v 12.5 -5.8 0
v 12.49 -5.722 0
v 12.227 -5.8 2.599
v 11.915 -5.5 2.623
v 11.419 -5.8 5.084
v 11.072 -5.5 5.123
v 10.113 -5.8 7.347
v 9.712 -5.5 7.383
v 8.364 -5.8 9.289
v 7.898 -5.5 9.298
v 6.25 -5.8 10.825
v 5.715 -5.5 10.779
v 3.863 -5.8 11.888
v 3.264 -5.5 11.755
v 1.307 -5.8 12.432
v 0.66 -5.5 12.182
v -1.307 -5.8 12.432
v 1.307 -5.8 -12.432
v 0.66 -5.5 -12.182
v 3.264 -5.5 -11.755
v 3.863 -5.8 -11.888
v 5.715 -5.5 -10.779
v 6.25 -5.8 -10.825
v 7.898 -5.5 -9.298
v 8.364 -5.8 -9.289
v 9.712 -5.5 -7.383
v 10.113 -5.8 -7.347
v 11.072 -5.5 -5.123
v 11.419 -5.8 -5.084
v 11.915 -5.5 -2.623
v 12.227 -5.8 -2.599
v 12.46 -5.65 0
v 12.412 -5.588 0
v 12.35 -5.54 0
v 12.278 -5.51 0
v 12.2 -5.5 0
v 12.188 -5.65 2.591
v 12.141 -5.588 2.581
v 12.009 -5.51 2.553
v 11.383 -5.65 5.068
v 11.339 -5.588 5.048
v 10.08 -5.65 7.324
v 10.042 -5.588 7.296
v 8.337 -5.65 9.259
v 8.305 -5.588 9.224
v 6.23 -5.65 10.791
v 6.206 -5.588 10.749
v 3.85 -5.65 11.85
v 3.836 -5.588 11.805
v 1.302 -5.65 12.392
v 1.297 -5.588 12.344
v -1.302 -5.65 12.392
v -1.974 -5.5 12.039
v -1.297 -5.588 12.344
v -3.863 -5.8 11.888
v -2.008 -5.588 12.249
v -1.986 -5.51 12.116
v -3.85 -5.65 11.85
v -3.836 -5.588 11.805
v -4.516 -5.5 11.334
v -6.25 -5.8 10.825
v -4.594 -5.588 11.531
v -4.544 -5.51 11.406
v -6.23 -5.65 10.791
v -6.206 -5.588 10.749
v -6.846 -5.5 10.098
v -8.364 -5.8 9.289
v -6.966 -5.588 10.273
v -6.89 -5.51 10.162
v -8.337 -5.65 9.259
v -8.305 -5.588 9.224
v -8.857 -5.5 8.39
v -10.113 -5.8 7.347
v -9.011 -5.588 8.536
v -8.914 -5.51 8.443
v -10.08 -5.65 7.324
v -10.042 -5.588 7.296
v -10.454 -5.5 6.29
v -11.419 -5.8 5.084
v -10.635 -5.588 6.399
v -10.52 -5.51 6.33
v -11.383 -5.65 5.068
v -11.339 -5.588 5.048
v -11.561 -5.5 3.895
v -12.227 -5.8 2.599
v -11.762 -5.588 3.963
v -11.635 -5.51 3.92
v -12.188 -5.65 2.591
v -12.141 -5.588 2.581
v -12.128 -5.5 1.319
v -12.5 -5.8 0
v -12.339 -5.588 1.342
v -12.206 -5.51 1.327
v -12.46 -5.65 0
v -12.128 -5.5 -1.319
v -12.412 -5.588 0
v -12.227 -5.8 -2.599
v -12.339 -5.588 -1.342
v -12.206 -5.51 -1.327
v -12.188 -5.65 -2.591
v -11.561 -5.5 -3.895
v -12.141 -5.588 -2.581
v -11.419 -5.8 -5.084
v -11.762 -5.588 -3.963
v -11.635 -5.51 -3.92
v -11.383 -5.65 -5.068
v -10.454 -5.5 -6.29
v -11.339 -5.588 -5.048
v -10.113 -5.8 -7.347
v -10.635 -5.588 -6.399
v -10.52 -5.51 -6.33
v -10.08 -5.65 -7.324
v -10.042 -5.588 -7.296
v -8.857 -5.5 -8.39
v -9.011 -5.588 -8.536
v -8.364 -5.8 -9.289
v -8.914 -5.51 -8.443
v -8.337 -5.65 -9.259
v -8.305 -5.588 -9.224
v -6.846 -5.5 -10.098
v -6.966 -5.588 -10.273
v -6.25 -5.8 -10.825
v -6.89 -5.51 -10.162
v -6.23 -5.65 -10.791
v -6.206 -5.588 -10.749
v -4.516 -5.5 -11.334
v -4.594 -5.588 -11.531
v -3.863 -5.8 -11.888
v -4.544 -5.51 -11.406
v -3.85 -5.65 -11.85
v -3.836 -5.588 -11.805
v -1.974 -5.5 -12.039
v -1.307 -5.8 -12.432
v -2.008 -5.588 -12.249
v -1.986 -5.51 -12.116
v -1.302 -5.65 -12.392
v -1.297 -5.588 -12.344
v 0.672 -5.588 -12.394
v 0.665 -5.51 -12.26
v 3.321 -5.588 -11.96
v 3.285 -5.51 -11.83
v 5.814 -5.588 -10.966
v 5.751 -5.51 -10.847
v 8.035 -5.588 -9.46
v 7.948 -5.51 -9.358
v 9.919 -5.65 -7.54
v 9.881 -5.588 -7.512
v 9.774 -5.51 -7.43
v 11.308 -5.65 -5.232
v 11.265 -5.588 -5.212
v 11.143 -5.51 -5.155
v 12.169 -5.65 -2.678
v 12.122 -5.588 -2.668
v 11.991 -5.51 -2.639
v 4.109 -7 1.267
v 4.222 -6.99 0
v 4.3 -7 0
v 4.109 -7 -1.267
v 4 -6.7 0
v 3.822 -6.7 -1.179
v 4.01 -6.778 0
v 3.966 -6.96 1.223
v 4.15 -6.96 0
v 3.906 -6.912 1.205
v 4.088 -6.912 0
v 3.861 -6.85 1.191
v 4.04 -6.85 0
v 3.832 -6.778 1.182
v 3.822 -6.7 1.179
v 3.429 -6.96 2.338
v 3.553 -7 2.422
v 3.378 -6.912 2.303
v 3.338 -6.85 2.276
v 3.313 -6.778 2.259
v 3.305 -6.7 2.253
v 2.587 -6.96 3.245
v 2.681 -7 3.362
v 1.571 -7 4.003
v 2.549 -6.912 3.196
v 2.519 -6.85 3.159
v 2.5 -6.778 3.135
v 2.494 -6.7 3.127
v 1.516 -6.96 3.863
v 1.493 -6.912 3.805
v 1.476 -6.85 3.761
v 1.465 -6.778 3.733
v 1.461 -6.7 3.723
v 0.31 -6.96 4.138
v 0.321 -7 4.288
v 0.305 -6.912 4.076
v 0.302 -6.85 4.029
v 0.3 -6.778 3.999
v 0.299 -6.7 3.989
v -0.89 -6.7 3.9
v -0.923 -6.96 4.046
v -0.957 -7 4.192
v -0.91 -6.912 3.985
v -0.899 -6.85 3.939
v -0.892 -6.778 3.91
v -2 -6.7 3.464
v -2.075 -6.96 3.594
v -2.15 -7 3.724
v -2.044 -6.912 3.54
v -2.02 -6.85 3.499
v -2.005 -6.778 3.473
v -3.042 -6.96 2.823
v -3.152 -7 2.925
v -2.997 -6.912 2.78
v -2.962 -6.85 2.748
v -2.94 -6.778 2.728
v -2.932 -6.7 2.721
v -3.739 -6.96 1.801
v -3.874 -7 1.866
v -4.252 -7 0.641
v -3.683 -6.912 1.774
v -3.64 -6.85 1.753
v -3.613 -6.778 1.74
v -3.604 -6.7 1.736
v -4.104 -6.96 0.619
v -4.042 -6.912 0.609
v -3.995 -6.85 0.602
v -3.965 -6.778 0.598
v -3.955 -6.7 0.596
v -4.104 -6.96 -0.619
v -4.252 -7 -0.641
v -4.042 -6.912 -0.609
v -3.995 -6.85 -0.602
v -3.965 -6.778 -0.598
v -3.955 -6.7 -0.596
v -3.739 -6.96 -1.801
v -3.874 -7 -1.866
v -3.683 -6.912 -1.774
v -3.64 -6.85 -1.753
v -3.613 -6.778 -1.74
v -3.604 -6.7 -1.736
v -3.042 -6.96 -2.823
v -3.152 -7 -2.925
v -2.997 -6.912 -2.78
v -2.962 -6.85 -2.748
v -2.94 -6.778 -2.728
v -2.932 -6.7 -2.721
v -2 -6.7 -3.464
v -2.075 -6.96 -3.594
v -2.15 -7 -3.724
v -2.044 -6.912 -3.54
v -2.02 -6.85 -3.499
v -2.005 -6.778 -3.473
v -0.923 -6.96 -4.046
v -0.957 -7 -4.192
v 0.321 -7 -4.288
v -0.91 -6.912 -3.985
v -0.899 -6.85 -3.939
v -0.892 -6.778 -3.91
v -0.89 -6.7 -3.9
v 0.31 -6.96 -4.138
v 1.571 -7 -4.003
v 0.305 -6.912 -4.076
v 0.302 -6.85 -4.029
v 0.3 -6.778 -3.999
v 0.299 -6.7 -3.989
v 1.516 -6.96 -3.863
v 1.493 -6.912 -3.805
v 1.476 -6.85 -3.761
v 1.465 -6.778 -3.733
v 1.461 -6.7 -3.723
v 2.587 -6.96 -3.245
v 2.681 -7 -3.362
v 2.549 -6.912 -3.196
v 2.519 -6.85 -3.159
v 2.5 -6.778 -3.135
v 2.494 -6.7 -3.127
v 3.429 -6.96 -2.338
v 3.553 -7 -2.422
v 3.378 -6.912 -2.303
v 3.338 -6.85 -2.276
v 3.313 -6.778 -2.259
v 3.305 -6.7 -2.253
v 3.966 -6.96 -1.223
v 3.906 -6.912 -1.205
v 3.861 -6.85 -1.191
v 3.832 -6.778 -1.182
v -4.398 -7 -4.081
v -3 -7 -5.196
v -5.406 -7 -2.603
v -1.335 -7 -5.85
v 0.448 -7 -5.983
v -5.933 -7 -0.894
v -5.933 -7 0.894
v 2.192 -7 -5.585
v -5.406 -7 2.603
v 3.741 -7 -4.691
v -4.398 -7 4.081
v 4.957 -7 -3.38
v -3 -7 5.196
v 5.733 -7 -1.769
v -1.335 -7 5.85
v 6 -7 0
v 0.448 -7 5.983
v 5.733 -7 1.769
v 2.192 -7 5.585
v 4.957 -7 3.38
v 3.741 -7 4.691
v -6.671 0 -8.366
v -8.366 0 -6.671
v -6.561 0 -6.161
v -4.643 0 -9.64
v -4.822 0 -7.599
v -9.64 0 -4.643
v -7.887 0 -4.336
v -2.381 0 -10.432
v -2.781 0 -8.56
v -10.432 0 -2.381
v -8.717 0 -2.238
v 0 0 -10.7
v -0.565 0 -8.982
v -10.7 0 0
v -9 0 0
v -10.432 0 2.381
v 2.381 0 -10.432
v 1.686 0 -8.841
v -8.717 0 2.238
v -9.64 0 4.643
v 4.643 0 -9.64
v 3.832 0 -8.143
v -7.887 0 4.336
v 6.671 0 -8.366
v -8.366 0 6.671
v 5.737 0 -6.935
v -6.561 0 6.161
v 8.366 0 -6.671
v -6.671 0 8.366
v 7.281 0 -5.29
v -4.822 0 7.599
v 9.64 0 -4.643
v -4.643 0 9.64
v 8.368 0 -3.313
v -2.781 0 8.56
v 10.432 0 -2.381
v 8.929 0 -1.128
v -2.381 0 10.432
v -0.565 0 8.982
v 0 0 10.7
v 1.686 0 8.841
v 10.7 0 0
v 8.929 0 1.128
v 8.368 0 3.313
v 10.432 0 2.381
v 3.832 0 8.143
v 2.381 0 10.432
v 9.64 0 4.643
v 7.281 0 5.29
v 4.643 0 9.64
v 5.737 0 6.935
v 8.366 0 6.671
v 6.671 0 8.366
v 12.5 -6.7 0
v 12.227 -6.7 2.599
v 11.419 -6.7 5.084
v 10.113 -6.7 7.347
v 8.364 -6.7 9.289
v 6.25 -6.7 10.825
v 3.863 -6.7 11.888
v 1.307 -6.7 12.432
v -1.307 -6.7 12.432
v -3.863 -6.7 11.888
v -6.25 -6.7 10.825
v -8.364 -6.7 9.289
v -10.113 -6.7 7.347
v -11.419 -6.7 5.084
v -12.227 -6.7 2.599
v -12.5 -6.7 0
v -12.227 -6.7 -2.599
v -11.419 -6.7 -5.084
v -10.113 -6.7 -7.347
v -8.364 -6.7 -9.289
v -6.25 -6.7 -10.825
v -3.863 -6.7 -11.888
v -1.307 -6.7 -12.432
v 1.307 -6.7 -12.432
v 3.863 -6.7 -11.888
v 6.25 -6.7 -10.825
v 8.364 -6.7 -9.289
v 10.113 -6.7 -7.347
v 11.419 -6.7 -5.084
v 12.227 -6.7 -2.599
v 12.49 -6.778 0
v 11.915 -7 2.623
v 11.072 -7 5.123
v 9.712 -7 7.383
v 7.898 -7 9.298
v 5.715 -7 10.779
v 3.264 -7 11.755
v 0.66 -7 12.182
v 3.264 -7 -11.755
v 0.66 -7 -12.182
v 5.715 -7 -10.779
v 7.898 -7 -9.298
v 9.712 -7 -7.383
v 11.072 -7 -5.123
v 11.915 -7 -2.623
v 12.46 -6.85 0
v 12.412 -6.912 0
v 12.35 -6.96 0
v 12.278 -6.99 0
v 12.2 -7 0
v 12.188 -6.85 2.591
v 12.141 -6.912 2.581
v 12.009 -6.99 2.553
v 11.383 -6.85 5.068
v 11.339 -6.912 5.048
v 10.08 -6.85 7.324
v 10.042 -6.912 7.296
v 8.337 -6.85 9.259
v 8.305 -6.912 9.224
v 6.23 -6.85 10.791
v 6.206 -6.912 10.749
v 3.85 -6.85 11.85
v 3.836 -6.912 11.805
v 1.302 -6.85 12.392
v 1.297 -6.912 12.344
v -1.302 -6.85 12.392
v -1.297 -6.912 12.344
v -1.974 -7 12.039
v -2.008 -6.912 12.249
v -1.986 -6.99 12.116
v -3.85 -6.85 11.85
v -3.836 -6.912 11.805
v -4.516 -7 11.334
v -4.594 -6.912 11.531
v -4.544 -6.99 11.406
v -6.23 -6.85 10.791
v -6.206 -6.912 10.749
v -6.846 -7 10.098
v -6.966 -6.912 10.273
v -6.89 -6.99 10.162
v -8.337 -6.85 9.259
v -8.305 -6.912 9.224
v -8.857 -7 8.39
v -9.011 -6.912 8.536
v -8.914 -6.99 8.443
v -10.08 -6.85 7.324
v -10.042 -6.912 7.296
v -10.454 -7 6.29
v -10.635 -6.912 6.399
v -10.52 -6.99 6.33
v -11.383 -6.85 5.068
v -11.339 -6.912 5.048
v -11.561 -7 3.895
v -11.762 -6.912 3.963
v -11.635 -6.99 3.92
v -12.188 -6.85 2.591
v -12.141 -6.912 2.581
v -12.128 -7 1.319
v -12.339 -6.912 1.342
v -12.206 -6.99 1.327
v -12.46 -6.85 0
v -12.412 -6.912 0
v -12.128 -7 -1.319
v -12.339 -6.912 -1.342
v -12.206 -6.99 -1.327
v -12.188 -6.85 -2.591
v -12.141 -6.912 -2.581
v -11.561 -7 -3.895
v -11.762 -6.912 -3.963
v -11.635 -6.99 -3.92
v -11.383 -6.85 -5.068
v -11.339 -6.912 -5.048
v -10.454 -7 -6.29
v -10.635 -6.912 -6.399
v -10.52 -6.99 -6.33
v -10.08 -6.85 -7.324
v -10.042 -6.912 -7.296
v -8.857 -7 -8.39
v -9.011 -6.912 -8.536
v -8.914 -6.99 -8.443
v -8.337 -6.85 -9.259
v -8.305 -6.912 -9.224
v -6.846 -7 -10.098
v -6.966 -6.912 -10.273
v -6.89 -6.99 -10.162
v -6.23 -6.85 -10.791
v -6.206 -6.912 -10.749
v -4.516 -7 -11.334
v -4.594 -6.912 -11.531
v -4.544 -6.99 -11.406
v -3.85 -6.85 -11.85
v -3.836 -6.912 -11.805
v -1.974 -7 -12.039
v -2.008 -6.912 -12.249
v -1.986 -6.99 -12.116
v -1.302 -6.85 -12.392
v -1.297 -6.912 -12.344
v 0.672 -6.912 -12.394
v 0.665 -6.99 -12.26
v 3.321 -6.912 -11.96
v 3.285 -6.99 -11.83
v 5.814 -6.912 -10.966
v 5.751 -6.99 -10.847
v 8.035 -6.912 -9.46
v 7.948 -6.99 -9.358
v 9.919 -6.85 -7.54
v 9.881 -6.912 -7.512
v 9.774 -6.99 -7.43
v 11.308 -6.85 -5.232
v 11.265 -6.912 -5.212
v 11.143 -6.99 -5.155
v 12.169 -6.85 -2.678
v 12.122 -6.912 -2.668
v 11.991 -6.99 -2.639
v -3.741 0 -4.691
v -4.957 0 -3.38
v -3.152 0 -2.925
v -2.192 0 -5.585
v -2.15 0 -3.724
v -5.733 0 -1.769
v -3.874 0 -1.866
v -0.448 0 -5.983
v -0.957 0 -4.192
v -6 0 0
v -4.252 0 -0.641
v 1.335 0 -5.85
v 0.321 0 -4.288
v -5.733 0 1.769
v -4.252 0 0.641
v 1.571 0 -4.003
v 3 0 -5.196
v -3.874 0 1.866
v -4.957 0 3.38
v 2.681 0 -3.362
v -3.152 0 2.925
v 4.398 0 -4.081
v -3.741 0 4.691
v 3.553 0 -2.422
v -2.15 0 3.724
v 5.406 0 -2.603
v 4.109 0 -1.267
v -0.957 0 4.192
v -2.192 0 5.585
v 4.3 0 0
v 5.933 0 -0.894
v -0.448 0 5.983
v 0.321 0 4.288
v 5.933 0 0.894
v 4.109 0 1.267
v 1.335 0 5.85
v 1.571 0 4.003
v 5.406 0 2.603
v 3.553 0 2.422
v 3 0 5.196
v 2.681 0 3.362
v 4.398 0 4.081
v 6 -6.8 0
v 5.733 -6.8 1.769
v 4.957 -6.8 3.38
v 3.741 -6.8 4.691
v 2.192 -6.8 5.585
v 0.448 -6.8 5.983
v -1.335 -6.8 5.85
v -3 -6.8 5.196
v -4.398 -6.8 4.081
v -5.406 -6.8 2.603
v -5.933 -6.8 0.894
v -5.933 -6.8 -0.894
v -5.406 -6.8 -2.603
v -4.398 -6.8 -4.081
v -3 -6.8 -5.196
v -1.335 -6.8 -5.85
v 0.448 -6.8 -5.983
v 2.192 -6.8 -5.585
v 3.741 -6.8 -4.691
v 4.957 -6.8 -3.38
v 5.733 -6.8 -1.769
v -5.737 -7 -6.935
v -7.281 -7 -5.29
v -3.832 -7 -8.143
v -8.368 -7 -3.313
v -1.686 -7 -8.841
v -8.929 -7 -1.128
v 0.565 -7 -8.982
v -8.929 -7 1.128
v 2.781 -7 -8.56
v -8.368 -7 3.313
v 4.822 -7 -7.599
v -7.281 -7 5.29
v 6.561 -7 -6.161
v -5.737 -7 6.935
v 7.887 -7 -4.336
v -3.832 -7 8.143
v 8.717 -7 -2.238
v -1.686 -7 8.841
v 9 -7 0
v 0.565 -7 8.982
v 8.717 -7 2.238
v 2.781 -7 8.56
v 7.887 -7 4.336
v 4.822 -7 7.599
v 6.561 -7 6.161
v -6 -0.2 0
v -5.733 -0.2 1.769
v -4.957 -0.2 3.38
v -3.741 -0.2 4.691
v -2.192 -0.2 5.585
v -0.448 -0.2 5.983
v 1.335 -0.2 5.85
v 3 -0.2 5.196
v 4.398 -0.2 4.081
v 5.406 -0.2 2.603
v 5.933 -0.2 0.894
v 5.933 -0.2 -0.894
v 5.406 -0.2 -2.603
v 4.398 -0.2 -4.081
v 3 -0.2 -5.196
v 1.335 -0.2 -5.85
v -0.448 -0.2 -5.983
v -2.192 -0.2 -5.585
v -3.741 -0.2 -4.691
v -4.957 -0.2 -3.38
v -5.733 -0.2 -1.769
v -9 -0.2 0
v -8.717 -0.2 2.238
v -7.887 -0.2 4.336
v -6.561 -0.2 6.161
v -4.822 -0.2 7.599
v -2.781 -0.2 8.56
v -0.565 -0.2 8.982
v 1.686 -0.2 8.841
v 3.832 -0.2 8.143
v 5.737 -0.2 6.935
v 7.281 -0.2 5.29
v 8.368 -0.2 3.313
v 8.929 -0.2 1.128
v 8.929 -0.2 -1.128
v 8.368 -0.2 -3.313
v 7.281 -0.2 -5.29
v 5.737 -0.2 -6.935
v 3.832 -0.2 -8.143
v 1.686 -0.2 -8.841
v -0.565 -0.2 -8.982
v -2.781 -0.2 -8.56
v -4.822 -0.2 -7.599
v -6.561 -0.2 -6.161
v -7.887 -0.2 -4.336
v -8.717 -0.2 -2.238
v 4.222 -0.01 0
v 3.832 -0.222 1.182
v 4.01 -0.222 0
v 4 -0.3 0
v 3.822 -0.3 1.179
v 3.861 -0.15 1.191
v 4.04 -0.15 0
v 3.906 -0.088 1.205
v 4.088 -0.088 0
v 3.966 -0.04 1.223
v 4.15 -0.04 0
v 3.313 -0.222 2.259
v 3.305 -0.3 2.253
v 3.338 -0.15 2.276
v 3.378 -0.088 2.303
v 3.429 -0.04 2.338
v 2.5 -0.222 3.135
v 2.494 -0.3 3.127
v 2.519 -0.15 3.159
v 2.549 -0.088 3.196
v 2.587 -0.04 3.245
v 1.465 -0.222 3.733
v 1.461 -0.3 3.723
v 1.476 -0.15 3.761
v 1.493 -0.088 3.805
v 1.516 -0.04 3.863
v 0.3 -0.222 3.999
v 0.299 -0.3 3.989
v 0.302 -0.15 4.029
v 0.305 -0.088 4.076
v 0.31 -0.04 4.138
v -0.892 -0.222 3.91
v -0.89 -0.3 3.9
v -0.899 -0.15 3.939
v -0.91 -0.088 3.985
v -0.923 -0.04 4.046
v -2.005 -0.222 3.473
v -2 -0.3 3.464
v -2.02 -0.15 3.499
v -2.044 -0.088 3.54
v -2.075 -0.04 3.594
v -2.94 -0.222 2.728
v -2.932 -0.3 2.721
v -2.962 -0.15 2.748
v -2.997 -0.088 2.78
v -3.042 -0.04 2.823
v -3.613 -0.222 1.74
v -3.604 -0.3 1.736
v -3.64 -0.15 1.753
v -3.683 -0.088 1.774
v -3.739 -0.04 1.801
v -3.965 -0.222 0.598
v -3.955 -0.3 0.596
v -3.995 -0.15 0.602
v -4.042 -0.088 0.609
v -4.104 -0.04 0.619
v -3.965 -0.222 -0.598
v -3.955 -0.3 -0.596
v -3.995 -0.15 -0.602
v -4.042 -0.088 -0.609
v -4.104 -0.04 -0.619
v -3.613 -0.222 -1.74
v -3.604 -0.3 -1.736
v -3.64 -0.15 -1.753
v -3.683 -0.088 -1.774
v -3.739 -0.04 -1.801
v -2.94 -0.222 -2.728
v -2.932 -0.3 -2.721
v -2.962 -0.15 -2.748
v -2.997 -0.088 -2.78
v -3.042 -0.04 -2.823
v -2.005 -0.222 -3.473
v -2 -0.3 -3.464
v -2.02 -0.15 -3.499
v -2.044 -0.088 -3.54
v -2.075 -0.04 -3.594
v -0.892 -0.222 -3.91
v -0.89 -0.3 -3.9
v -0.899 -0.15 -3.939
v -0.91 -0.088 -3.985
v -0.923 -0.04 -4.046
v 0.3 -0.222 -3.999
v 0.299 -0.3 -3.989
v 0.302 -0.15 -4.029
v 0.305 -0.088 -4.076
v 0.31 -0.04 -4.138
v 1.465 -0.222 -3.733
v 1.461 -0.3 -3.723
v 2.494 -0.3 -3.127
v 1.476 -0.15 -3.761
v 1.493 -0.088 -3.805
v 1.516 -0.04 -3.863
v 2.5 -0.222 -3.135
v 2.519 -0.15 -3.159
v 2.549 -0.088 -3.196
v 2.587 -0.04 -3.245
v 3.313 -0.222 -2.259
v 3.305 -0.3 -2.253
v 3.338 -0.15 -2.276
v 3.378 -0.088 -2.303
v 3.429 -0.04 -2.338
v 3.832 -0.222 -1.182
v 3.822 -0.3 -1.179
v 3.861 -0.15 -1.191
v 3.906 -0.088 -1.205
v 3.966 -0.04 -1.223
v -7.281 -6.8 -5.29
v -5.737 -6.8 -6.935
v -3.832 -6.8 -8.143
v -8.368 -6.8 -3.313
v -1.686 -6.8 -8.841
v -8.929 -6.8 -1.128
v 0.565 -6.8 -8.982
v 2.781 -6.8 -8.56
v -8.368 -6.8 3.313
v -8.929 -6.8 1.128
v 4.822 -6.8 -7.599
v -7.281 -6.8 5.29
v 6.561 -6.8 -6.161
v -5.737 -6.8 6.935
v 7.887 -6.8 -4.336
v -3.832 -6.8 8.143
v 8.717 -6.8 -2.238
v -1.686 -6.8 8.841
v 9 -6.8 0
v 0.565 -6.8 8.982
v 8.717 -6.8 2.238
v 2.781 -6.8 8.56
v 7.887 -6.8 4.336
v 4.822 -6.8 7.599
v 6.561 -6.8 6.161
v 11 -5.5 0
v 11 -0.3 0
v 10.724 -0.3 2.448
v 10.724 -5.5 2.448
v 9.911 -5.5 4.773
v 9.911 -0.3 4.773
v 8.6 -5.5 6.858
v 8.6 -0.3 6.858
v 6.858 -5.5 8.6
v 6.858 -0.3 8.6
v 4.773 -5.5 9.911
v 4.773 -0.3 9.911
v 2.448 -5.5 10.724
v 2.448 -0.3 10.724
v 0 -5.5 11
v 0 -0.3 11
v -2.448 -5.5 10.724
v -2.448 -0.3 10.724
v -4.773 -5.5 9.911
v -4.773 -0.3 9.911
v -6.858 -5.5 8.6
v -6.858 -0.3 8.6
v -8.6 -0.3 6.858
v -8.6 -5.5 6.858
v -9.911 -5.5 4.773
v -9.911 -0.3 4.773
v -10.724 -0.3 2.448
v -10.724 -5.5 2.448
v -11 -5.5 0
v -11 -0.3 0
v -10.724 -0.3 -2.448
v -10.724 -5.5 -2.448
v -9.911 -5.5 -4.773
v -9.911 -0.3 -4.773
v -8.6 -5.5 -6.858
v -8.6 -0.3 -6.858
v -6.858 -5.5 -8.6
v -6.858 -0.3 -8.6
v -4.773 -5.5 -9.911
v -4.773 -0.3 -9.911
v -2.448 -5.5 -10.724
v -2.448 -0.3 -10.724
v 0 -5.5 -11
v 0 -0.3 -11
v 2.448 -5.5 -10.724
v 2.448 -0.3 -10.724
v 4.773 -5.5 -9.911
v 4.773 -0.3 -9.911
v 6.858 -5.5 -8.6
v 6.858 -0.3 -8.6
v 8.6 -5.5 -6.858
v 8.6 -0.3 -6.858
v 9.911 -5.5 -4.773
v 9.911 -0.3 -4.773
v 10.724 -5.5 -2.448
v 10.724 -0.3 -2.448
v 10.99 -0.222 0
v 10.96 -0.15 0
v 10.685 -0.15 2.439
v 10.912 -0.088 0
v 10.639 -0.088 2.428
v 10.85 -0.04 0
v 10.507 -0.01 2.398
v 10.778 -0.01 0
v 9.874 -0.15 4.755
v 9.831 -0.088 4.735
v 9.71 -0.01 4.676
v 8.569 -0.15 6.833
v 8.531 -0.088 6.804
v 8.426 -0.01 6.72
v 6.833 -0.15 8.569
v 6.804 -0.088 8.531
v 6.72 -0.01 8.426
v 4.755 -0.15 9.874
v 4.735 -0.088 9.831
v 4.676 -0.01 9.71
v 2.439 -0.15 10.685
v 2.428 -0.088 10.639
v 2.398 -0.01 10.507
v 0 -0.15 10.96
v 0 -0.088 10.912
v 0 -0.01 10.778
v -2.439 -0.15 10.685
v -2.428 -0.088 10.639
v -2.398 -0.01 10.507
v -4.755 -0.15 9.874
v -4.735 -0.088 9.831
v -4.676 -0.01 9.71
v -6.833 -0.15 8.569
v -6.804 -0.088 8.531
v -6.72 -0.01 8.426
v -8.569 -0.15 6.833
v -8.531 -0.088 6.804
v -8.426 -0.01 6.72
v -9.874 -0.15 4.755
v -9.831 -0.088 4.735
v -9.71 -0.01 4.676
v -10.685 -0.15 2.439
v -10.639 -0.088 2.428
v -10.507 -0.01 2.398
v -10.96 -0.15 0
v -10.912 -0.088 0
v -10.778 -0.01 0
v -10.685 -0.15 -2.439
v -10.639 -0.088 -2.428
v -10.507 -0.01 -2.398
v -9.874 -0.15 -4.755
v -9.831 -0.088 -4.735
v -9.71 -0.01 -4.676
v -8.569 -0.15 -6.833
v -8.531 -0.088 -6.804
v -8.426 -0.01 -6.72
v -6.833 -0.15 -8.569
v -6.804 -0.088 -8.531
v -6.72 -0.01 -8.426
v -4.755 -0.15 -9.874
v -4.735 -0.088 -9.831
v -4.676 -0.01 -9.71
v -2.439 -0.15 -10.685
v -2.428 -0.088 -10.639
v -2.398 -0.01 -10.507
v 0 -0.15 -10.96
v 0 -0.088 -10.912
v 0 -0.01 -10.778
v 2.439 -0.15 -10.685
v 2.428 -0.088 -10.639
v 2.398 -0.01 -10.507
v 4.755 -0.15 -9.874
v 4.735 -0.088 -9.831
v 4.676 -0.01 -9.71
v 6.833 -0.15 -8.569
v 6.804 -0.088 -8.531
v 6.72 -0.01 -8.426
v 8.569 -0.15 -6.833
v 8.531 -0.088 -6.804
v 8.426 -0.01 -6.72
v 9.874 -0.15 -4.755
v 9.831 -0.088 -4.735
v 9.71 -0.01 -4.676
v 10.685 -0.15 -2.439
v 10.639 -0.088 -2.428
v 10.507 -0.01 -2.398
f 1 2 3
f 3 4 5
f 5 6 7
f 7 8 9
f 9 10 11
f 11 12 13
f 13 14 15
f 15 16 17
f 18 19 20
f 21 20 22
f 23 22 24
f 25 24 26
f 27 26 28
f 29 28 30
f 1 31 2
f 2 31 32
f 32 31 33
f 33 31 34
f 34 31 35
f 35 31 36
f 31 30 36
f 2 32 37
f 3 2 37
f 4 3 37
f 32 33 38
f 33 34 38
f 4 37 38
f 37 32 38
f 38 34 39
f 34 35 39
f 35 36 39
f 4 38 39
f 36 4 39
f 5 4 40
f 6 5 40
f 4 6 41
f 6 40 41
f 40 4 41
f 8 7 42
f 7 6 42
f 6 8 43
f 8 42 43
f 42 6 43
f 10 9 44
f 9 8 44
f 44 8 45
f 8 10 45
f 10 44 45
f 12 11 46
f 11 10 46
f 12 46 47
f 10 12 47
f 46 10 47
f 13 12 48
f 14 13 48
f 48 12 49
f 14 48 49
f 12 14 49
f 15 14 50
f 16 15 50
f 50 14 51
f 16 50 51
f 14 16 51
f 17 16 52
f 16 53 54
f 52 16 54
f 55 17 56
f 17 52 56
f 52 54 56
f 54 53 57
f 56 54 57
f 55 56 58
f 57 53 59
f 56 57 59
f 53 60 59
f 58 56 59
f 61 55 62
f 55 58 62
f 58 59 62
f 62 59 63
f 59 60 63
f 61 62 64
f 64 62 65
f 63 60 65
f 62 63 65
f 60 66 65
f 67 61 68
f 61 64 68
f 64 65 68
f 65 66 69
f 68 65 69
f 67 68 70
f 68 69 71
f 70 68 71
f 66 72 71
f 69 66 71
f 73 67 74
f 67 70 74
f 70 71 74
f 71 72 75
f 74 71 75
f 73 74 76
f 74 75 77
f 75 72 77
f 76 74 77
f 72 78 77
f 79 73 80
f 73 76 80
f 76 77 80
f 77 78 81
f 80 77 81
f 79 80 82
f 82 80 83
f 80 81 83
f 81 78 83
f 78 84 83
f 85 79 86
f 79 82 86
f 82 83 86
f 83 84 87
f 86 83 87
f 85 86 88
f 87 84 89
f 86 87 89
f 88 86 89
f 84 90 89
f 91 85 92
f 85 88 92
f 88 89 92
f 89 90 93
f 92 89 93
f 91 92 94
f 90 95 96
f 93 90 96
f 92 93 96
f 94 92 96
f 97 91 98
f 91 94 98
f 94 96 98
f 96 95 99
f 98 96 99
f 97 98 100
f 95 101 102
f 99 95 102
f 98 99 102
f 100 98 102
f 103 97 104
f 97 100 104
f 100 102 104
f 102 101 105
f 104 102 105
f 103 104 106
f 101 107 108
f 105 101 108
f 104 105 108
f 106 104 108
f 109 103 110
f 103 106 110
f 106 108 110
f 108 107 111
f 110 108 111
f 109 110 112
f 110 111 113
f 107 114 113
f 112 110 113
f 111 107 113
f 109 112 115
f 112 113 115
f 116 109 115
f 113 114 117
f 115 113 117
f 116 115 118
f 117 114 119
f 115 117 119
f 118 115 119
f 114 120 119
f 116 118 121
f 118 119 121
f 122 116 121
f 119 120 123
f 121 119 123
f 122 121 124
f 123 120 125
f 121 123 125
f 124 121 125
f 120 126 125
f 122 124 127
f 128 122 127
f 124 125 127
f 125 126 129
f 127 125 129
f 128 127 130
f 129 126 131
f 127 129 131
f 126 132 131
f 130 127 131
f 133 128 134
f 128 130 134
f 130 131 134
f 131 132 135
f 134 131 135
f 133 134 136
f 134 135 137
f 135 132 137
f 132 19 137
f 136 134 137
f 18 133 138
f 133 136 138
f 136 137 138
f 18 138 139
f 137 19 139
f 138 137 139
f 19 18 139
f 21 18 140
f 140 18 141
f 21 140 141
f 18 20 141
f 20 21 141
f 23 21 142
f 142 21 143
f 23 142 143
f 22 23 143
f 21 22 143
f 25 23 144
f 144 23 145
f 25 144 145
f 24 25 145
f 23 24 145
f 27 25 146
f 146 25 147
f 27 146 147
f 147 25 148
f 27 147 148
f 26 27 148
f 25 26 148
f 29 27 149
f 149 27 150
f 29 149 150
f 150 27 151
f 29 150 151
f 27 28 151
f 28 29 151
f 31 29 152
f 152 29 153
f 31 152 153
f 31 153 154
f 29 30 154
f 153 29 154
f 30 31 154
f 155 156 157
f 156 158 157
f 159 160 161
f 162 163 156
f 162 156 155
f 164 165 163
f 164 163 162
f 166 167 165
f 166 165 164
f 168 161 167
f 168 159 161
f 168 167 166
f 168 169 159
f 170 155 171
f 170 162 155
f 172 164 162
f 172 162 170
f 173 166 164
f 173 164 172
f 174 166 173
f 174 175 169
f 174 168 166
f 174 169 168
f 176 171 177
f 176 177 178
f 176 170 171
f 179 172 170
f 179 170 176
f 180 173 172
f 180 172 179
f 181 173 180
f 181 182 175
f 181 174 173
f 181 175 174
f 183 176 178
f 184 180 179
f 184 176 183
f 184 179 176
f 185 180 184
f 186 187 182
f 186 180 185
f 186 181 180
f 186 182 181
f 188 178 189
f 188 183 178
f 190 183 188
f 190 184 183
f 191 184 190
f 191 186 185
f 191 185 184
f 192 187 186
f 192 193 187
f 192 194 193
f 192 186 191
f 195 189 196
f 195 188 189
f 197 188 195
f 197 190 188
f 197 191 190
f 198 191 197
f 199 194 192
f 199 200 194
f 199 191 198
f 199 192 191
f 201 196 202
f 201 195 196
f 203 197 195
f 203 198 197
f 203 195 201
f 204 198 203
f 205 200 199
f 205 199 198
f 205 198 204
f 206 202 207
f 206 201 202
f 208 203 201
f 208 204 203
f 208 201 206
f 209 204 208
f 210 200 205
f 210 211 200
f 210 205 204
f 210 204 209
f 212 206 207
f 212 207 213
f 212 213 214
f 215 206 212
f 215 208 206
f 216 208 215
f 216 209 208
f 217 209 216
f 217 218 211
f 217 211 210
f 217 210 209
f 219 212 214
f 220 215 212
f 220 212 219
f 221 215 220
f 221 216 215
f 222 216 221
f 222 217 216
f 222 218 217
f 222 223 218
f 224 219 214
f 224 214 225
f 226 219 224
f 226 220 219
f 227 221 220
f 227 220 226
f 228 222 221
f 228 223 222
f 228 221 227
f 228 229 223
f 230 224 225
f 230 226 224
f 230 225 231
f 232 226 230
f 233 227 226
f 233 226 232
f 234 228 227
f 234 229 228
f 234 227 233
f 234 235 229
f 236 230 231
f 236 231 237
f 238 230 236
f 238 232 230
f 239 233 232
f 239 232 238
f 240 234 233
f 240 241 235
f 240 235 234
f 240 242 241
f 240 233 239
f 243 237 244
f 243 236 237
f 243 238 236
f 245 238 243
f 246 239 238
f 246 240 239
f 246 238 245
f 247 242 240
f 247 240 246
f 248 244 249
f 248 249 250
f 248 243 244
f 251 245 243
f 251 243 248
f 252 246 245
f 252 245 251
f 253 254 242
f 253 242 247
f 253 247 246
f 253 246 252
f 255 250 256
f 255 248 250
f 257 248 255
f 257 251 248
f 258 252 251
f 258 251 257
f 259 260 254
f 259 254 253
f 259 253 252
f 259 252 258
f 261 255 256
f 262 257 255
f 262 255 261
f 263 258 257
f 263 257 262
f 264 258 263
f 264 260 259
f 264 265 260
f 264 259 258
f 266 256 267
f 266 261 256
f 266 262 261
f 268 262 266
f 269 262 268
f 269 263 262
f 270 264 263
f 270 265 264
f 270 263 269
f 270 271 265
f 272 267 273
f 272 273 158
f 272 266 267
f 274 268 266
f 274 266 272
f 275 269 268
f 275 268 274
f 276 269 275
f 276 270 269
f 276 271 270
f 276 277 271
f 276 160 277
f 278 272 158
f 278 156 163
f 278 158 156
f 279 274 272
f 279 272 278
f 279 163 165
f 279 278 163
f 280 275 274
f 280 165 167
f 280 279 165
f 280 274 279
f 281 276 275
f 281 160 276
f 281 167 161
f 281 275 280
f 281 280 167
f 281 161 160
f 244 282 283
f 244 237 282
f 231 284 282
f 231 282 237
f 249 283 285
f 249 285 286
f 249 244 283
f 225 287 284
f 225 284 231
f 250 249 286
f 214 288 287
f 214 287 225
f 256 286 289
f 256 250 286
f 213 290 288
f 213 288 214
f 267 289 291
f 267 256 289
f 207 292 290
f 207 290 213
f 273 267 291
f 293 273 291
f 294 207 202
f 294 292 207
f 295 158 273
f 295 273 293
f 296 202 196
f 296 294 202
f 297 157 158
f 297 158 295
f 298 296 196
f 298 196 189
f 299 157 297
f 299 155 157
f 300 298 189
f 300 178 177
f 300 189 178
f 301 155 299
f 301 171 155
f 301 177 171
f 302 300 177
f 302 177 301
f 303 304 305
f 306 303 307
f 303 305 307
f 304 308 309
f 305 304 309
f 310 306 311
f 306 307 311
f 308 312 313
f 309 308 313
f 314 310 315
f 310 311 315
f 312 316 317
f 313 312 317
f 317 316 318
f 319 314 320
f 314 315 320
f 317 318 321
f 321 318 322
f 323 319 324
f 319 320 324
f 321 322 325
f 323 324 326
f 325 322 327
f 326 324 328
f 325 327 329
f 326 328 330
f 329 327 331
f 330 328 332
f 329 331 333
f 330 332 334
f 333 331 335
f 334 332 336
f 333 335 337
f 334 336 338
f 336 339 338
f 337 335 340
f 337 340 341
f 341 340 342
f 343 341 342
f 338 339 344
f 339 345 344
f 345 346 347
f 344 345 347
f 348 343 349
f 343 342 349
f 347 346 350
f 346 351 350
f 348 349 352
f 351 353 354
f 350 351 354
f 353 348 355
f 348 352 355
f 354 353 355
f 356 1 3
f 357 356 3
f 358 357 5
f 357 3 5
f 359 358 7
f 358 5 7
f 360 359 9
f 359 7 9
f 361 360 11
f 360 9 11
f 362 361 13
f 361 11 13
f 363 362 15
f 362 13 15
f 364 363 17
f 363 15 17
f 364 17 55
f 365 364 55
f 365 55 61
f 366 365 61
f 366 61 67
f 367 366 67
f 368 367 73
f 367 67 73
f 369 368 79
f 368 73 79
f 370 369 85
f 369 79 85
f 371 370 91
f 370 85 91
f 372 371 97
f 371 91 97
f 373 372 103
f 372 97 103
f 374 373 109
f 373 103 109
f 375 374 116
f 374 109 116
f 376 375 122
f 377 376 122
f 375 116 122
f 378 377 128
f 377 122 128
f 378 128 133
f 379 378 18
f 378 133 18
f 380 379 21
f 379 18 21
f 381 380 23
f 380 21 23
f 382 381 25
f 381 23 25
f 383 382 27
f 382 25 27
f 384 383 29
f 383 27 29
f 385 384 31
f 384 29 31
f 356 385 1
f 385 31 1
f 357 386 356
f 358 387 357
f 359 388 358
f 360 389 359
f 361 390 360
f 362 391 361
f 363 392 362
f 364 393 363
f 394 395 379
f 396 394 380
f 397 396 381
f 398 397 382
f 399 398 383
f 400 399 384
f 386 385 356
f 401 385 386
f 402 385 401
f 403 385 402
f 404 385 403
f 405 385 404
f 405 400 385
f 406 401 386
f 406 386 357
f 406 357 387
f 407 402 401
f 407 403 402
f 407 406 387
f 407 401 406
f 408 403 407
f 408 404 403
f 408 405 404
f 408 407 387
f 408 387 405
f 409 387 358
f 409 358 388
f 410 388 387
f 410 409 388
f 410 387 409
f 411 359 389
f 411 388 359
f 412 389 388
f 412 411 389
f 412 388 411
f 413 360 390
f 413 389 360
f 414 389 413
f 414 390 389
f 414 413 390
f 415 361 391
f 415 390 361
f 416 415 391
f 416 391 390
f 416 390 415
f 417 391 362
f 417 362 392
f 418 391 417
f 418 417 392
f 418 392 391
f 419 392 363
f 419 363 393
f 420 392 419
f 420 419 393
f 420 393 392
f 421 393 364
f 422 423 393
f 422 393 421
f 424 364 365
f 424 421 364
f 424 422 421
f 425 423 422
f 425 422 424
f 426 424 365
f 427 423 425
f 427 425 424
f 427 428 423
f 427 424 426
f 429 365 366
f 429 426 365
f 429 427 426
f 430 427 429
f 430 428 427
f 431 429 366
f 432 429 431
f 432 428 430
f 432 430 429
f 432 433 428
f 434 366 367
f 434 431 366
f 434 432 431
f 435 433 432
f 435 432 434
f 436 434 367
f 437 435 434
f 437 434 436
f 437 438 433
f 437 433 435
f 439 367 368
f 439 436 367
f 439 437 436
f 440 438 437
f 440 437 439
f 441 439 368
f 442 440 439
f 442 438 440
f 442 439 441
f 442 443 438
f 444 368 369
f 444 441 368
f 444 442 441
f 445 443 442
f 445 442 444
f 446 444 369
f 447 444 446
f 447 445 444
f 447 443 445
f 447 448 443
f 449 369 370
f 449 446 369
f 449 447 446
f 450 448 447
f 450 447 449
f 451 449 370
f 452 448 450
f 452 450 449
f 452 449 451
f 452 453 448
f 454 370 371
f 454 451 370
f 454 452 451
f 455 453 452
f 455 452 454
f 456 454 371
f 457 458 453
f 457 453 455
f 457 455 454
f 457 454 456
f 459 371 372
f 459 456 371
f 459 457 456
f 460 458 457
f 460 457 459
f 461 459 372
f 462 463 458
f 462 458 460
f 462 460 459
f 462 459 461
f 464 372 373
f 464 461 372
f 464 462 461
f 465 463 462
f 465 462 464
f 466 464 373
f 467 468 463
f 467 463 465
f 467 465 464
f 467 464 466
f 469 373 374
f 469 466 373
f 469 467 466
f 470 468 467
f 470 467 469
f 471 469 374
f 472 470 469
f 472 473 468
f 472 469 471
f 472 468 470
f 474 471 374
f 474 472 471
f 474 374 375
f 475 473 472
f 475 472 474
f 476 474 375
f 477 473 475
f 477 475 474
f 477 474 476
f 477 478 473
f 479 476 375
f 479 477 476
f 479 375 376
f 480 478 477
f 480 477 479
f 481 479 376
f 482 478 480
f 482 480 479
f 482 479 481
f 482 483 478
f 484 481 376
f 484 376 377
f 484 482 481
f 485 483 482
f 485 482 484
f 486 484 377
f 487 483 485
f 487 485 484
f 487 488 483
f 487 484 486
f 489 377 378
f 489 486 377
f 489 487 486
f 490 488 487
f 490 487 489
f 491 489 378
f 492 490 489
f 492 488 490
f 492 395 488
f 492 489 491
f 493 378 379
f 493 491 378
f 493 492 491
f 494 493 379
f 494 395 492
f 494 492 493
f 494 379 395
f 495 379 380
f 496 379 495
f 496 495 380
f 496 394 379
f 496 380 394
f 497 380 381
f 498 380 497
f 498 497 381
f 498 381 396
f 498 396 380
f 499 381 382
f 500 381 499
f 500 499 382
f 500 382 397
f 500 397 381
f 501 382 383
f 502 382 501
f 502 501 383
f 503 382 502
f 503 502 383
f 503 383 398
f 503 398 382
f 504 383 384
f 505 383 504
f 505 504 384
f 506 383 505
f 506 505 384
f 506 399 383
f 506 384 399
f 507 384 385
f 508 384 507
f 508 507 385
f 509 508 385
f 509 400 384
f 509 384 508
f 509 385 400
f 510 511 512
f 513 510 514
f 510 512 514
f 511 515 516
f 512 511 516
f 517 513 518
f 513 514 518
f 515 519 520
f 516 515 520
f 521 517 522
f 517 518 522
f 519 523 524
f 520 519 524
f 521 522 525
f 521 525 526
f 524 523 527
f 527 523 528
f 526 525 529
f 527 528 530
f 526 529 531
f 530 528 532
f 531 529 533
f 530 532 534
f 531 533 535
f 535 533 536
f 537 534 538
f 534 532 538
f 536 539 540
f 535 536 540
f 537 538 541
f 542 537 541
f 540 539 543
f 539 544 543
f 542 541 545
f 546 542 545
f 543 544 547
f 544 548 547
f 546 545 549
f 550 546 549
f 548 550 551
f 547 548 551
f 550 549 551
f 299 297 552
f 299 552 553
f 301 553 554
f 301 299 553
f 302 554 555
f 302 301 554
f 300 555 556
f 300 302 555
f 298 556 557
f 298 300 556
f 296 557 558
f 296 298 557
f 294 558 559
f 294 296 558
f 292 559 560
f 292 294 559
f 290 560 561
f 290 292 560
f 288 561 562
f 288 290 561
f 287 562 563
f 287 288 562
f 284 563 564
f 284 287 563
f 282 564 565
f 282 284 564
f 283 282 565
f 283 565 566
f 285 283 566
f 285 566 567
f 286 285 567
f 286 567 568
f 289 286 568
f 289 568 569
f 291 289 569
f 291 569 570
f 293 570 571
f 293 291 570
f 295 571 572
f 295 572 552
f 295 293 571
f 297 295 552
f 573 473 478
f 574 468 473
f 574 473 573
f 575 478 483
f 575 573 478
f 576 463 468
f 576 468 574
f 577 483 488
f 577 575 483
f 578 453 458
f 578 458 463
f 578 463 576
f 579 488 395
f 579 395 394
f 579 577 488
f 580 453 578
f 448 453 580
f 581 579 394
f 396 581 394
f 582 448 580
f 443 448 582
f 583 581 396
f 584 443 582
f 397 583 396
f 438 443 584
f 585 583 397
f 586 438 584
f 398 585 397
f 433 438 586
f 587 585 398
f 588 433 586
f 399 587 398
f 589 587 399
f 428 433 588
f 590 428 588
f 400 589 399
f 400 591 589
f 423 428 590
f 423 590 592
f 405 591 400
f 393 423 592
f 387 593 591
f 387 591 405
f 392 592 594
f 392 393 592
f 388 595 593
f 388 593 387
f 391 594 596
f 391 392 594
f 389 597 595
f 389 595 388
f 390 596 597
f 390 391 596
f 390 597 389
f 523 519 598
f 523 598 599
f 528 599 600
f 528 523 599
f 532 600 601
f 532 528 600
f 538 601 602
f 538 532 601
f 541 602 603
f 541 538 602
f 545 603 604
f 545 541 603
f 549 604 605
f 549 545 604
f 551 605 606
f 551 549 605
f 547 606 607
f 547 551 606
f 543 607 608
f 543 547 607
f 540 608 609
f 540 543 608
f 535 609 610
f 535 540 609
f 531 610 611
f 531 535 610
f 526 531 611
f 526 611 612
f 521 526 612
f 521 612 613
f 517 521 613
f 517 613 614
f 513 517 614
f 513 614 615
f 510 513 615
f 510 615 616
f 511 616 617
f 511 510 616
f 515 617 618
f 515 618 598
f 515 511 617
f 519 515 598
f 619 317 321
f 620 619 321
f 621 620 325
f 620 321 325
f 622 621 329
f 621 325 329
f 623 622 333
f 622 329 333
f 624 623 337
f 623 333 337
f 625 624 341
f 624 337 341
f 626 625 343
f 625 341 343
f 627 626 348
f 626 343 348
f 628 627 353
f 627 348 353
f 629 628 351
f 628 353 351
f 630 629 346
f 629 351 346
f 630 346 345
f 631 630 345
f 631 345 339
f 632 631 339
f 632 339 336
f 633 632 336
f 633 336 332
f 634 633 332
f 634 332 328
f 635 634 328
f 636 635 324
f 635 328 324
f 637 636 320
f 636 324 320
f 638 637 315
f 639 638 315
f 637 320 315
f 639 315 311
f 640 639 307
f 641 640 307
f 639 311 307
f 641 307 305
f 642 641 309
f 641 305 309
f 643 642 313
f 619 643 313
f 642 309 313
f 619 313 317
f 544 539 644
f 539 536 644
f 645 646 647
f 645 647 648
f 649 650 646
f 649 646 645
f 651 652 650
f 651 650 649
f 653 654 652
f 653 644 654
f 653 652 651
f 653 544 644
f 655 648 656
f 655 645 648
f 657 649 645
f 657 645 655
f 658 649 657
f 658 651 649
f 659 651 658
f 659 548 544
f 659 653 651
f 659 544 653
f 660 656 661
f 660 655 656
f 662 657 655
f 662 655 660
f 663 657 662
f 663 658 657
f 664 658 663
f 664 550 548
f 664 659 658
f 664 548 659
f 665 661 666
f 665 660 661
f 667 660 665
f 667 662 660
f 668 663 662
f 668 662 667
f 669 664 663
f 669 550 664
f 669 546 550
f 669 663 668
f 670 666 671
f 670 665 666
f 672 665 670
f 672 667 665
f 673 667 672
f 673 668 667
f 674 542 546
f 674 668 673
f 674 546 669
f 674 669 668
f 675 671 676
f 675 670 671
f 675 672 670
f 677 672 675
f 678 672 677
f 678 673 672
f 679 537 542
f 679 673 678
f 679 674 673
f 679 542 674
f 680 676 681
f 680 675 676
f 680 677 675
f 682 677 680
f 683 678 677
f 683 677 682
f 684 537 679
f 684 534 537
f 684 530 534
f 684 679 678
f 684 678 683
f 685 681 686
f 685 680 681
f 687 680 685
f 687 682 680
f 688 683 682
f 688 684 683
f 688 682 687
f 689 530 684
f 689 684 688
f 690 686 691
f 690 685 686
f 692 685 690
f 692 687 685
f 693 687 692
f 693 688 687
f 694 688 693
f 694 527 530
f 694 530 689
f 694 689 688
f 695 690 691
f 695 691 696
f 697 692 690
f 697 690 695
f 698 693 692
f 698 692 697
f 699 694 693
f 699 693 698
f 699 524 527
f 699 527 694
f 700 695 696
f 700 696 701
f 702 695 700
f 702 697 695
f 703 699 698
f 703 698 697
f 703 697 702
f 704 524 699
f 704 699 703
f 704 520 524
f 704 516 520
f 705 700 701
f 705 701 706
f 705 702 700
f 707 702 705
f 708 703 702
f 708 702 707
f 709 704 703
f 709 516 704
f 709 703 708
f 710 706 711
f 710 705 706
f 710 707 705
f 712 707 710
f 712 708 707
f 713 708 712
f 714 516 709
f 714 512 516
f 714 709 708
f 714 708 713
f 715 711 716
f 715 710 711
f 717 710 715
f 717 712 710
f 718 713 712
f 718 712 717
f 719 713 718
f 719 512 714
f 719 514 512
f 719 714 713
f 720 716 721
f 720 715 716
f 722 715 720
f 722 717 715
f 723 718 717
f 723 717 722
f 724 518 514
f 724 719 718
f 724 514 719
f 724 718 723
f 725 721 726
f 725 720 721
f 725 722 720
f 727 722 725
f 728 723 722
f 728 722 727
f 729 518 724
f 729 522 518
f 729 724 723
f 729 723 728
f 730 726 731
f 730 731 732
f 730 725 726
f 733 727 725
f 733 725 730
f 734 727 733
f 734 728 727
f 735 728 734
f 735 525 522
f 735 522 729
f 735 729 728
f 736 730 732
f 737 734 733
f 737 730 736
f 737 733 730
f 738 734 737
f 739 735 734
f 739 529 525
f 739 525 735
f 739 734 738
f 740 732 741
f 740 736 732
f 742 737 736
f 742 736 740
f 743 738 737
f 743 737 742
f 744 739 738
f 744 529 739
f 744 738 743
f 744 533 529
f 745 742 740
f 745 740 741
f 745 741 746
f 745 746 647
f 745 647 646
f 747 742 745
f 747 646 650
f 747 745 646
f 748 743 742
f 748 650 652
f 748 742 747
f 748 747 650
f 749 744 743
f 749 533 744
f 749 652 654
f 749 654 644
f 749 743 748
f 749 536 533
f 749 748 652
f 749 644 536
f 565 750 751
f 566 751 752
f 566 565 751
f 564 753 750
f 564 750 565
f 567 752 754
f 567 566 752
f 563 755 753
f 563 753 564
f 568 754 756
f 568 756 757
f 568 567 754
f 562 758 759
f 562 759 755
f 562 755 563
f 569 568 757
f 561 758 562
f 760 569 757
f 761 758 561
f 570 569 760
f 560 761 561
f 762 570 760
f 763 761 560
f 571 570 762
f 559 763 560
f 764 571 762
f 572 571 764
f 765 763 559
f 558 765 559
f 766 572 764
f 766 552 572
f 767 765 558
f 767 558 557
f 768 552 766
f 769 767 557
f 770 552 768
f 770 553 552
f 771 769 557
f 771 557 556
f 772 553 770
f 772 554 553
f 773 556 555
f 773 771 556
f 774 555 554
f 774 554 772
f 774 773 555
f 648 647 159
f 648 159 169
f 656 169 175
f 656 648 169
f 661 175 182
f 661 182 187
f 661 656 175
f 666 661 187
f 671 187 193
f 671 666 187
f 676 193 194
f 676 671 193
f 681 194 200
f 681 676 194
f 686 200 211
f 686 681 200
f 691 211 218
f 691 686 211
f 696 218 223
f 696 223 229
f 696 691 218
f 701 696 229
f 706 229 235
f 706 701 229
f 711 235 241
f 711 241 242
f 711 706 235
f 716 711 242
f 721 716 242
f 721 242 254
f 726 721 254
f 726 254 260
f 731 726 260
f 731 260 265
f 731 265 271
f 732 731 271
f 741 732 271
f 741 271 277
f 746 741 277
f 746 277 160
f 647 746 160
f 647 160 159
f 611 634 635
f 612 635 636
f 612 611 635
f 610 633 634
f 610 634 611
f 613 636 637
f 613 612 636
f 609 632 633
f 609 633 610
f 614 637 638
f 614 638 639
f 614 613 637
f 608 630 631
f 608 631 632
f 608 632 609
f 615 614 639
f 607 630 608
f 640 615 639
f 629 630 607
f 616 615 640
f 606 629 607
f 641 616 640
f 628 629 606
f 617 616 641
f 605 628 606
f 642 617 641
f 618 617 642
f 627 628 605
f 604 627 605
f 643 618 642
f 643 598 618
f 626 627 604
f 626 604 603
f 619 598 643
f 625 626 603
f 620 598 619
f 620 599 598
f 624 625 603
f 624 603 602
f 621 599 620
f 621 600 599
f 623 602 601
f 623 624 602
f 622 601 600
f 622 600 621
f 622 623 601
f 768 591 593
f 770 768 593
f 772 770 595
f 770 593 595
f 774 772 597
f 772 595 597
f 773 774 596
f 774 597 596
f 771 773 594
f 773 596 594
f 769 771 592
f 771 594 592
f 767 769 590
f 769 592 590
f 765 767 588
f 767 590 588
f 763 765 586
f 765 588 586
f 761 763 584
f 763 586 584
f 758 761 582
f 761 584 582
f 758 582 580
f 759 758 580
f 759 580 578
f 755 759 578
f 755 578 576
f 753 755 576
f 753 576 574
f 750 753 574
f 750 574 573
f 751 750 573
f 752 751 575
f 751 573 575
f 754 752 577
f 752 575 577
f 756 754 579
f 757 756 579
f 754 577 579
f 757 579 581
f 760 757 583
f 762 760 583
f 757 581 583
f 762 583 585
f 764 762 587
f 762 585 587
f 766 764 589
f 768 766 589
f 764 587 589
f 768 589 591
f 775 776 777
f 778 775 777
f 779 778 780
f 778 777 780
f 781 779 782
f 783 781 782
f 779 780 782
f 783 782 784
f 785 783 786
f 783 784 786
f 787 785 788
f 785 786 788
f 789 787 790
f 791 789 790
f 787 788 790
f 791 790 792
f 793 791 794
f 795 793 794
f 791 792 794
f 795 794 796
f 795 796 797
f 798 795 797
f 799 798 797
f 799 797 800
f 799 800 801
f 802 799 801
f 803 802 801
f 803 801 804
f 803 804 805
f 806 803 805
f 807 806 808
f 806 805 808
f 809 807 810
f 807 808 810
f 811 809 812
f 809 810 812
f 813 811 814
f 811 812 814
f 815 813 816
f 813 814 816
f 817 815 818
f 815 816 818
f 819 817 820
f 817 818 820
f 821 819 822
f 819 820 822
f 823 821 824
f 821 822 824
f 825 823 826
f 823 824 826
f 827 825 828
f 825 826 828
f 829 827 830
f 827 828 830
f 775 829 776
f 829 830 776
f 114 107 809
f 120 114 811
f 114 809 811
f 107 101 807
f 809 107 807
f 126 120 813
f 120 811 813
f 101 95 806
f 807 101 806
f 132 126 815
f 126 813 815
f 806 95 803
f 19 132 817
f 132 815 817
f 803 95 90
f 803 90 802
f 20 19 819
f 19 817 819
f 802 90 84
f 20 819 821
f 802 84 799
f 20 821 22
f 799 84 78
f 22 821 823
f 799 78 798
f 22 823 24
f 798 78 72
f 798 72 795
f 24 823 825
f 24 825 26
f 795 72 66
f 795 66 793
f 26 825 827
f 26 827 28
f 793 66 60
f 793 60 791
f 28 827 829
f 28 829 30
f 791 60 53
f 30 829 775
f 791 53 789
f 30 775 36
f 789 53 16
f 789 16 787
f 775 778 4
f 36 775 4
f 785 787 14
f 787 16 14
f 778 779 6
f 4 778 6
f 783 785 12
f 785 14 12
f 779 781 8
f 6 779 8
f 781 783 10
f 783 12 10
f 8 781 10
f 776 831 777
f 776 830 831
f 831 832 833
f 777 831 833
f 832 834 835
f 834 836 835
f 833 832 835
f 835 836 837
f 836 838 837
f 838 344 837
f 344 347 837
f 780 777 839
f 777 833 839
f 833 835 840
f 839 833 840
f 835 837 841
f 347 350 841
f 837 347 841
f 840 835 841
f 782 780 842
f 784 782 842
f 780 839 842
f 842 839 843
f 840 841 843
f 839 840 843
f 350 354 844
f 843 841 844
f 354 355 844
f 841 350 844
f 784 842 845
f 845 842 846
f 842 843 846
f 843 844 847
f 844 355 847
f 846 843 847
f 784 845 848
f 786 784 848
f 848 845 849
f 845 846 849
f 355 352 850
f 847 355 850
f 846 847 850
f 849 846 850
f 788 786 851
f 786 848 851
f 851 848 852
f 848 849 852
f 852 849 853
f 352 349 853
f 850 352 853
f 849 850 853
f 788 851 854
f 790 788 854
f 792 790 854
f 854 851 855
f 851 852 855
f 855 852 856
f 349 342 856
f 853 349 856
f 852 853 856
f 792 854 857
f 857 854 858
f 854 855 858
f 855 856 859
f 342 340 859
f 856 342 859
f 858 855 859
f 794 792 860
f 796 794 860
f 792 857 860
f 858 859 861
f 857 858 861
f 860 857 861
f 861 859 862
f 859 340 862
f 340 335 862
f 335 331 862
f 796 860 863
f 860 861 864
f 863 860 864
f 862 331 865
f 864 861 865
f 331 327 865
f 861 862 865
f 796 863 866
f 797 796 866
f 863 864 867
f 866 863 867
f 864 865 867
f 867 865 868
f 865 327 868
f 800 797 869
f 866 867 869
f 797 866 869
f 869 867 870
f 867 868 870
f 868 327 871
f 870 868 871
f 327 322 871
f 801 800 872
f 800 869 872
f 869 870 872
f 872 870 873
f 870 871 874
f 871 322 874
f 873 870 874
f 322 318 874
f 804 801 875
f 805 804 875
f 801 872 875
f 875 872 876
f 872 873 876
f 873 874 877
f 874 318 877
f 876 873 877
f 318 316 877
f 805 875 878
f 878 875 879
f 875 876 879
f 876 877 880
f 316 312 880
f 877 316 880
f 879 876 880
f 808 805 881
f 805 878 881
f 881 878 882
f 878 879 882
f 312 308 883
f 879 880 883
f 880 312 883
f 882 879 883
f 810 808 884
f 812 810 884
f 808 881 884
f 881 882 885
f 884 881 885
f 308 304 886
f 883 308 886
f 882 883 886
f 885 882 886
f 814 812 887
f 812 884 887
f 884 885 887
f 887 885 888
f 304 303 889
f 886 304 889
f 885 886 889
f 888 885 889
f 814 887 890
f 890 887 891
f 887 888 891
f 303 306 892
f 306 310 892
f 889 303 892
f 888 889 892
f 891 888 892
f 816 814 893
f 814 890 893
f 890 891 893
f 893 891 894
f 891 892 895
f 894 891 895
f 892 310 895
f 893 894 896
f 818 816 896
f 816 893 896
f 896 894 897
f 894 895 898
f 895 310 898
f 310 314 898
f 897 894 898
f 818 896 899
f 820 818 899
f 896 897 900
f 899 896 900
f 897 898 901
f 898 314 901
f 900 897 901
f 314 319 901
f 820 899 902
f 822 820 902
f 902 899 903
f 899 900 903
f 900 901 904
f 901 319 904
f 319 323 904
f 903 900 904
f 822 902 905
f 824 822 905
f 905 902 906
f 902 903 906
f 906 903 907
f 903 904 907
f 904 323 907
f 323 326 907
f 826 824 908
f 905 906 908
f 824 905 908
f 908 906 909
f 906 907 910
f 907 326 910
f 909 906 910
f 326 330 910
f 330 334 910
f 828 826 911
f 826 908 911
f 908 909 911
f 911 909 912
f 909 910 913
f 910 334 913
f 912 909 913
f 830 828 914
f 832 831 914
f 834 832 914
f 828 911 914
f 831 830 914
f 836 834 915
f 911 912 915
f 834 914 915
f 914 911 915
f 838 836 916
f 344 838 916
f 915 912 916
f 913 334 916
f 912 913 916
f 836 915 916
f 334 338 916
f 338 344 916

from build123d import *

# Parameters (mm, degrees)
F0_R     = 11
F0_R_2   = 4
F1_DEPTH = 5.5
F2_R     = 12.5
F2_R_2   = 4
F3_DEPTH = 1.5
F4_R     = 9
F4_R_2   = 6
F5_DEPTH = 0.2
F6_R     = 9
F6_R_2   = 6
F7_DEPTH = 0.2
F8_R     = 0.3


with BuildPart() as f1:
    # F0 (on Front) → F1 (new body)
    with BuildSketch(Plane.XZ):
        Circle(F0_R)
        Circle(F0_R_2, mode=Mode.SUBTRACT)
    extrude(amount=F1_DEPTH)

    # F2 (on face) → F3 (join)
    with BuildSketch(Plane.XZ.offset(5.5)):
        Circle(F2_R)
        Circle(F2_R_2, mode=Mode.SUBTRACT)
    extrude(amount=F3_DEPTH)

    # F4 (on face) → F5 (cut)
    with BuildSketch(Plane(origin=(0, 0, 0), x_dir=(-1, 0, 0), z_dir=(0, 1, 0))):
        Circle(F4_R)
        Circle(F4_R_2, mode=Mode.SUBTRACT)
    extrude(amount=-F5_DEPTH, mode=Mode.SUBTRACT)

    # F6 (on face) → F7 (cut)
    with BuildSketch(Plane.XZ.offset(7)):
        Circle(F6_R)
        Circle(F6_R_2, mode=Mode.SUBTRACT)
    extrude(amount=-F7_DEPTH, mode=Mode.SUBTRACT)

    # F8
    f8_edges = [f1.edges().sort_by_distance(p)[0] for p in [
        (-12.5, -7, 0),
        (-12.5, -5.5, 0),
        (-11, 0, 0),
        (-4, -7, 0),
        (-4, 0, 0),
    ]]
    fillet(f8_edges, radius=F8_R)


solid = f1.part
